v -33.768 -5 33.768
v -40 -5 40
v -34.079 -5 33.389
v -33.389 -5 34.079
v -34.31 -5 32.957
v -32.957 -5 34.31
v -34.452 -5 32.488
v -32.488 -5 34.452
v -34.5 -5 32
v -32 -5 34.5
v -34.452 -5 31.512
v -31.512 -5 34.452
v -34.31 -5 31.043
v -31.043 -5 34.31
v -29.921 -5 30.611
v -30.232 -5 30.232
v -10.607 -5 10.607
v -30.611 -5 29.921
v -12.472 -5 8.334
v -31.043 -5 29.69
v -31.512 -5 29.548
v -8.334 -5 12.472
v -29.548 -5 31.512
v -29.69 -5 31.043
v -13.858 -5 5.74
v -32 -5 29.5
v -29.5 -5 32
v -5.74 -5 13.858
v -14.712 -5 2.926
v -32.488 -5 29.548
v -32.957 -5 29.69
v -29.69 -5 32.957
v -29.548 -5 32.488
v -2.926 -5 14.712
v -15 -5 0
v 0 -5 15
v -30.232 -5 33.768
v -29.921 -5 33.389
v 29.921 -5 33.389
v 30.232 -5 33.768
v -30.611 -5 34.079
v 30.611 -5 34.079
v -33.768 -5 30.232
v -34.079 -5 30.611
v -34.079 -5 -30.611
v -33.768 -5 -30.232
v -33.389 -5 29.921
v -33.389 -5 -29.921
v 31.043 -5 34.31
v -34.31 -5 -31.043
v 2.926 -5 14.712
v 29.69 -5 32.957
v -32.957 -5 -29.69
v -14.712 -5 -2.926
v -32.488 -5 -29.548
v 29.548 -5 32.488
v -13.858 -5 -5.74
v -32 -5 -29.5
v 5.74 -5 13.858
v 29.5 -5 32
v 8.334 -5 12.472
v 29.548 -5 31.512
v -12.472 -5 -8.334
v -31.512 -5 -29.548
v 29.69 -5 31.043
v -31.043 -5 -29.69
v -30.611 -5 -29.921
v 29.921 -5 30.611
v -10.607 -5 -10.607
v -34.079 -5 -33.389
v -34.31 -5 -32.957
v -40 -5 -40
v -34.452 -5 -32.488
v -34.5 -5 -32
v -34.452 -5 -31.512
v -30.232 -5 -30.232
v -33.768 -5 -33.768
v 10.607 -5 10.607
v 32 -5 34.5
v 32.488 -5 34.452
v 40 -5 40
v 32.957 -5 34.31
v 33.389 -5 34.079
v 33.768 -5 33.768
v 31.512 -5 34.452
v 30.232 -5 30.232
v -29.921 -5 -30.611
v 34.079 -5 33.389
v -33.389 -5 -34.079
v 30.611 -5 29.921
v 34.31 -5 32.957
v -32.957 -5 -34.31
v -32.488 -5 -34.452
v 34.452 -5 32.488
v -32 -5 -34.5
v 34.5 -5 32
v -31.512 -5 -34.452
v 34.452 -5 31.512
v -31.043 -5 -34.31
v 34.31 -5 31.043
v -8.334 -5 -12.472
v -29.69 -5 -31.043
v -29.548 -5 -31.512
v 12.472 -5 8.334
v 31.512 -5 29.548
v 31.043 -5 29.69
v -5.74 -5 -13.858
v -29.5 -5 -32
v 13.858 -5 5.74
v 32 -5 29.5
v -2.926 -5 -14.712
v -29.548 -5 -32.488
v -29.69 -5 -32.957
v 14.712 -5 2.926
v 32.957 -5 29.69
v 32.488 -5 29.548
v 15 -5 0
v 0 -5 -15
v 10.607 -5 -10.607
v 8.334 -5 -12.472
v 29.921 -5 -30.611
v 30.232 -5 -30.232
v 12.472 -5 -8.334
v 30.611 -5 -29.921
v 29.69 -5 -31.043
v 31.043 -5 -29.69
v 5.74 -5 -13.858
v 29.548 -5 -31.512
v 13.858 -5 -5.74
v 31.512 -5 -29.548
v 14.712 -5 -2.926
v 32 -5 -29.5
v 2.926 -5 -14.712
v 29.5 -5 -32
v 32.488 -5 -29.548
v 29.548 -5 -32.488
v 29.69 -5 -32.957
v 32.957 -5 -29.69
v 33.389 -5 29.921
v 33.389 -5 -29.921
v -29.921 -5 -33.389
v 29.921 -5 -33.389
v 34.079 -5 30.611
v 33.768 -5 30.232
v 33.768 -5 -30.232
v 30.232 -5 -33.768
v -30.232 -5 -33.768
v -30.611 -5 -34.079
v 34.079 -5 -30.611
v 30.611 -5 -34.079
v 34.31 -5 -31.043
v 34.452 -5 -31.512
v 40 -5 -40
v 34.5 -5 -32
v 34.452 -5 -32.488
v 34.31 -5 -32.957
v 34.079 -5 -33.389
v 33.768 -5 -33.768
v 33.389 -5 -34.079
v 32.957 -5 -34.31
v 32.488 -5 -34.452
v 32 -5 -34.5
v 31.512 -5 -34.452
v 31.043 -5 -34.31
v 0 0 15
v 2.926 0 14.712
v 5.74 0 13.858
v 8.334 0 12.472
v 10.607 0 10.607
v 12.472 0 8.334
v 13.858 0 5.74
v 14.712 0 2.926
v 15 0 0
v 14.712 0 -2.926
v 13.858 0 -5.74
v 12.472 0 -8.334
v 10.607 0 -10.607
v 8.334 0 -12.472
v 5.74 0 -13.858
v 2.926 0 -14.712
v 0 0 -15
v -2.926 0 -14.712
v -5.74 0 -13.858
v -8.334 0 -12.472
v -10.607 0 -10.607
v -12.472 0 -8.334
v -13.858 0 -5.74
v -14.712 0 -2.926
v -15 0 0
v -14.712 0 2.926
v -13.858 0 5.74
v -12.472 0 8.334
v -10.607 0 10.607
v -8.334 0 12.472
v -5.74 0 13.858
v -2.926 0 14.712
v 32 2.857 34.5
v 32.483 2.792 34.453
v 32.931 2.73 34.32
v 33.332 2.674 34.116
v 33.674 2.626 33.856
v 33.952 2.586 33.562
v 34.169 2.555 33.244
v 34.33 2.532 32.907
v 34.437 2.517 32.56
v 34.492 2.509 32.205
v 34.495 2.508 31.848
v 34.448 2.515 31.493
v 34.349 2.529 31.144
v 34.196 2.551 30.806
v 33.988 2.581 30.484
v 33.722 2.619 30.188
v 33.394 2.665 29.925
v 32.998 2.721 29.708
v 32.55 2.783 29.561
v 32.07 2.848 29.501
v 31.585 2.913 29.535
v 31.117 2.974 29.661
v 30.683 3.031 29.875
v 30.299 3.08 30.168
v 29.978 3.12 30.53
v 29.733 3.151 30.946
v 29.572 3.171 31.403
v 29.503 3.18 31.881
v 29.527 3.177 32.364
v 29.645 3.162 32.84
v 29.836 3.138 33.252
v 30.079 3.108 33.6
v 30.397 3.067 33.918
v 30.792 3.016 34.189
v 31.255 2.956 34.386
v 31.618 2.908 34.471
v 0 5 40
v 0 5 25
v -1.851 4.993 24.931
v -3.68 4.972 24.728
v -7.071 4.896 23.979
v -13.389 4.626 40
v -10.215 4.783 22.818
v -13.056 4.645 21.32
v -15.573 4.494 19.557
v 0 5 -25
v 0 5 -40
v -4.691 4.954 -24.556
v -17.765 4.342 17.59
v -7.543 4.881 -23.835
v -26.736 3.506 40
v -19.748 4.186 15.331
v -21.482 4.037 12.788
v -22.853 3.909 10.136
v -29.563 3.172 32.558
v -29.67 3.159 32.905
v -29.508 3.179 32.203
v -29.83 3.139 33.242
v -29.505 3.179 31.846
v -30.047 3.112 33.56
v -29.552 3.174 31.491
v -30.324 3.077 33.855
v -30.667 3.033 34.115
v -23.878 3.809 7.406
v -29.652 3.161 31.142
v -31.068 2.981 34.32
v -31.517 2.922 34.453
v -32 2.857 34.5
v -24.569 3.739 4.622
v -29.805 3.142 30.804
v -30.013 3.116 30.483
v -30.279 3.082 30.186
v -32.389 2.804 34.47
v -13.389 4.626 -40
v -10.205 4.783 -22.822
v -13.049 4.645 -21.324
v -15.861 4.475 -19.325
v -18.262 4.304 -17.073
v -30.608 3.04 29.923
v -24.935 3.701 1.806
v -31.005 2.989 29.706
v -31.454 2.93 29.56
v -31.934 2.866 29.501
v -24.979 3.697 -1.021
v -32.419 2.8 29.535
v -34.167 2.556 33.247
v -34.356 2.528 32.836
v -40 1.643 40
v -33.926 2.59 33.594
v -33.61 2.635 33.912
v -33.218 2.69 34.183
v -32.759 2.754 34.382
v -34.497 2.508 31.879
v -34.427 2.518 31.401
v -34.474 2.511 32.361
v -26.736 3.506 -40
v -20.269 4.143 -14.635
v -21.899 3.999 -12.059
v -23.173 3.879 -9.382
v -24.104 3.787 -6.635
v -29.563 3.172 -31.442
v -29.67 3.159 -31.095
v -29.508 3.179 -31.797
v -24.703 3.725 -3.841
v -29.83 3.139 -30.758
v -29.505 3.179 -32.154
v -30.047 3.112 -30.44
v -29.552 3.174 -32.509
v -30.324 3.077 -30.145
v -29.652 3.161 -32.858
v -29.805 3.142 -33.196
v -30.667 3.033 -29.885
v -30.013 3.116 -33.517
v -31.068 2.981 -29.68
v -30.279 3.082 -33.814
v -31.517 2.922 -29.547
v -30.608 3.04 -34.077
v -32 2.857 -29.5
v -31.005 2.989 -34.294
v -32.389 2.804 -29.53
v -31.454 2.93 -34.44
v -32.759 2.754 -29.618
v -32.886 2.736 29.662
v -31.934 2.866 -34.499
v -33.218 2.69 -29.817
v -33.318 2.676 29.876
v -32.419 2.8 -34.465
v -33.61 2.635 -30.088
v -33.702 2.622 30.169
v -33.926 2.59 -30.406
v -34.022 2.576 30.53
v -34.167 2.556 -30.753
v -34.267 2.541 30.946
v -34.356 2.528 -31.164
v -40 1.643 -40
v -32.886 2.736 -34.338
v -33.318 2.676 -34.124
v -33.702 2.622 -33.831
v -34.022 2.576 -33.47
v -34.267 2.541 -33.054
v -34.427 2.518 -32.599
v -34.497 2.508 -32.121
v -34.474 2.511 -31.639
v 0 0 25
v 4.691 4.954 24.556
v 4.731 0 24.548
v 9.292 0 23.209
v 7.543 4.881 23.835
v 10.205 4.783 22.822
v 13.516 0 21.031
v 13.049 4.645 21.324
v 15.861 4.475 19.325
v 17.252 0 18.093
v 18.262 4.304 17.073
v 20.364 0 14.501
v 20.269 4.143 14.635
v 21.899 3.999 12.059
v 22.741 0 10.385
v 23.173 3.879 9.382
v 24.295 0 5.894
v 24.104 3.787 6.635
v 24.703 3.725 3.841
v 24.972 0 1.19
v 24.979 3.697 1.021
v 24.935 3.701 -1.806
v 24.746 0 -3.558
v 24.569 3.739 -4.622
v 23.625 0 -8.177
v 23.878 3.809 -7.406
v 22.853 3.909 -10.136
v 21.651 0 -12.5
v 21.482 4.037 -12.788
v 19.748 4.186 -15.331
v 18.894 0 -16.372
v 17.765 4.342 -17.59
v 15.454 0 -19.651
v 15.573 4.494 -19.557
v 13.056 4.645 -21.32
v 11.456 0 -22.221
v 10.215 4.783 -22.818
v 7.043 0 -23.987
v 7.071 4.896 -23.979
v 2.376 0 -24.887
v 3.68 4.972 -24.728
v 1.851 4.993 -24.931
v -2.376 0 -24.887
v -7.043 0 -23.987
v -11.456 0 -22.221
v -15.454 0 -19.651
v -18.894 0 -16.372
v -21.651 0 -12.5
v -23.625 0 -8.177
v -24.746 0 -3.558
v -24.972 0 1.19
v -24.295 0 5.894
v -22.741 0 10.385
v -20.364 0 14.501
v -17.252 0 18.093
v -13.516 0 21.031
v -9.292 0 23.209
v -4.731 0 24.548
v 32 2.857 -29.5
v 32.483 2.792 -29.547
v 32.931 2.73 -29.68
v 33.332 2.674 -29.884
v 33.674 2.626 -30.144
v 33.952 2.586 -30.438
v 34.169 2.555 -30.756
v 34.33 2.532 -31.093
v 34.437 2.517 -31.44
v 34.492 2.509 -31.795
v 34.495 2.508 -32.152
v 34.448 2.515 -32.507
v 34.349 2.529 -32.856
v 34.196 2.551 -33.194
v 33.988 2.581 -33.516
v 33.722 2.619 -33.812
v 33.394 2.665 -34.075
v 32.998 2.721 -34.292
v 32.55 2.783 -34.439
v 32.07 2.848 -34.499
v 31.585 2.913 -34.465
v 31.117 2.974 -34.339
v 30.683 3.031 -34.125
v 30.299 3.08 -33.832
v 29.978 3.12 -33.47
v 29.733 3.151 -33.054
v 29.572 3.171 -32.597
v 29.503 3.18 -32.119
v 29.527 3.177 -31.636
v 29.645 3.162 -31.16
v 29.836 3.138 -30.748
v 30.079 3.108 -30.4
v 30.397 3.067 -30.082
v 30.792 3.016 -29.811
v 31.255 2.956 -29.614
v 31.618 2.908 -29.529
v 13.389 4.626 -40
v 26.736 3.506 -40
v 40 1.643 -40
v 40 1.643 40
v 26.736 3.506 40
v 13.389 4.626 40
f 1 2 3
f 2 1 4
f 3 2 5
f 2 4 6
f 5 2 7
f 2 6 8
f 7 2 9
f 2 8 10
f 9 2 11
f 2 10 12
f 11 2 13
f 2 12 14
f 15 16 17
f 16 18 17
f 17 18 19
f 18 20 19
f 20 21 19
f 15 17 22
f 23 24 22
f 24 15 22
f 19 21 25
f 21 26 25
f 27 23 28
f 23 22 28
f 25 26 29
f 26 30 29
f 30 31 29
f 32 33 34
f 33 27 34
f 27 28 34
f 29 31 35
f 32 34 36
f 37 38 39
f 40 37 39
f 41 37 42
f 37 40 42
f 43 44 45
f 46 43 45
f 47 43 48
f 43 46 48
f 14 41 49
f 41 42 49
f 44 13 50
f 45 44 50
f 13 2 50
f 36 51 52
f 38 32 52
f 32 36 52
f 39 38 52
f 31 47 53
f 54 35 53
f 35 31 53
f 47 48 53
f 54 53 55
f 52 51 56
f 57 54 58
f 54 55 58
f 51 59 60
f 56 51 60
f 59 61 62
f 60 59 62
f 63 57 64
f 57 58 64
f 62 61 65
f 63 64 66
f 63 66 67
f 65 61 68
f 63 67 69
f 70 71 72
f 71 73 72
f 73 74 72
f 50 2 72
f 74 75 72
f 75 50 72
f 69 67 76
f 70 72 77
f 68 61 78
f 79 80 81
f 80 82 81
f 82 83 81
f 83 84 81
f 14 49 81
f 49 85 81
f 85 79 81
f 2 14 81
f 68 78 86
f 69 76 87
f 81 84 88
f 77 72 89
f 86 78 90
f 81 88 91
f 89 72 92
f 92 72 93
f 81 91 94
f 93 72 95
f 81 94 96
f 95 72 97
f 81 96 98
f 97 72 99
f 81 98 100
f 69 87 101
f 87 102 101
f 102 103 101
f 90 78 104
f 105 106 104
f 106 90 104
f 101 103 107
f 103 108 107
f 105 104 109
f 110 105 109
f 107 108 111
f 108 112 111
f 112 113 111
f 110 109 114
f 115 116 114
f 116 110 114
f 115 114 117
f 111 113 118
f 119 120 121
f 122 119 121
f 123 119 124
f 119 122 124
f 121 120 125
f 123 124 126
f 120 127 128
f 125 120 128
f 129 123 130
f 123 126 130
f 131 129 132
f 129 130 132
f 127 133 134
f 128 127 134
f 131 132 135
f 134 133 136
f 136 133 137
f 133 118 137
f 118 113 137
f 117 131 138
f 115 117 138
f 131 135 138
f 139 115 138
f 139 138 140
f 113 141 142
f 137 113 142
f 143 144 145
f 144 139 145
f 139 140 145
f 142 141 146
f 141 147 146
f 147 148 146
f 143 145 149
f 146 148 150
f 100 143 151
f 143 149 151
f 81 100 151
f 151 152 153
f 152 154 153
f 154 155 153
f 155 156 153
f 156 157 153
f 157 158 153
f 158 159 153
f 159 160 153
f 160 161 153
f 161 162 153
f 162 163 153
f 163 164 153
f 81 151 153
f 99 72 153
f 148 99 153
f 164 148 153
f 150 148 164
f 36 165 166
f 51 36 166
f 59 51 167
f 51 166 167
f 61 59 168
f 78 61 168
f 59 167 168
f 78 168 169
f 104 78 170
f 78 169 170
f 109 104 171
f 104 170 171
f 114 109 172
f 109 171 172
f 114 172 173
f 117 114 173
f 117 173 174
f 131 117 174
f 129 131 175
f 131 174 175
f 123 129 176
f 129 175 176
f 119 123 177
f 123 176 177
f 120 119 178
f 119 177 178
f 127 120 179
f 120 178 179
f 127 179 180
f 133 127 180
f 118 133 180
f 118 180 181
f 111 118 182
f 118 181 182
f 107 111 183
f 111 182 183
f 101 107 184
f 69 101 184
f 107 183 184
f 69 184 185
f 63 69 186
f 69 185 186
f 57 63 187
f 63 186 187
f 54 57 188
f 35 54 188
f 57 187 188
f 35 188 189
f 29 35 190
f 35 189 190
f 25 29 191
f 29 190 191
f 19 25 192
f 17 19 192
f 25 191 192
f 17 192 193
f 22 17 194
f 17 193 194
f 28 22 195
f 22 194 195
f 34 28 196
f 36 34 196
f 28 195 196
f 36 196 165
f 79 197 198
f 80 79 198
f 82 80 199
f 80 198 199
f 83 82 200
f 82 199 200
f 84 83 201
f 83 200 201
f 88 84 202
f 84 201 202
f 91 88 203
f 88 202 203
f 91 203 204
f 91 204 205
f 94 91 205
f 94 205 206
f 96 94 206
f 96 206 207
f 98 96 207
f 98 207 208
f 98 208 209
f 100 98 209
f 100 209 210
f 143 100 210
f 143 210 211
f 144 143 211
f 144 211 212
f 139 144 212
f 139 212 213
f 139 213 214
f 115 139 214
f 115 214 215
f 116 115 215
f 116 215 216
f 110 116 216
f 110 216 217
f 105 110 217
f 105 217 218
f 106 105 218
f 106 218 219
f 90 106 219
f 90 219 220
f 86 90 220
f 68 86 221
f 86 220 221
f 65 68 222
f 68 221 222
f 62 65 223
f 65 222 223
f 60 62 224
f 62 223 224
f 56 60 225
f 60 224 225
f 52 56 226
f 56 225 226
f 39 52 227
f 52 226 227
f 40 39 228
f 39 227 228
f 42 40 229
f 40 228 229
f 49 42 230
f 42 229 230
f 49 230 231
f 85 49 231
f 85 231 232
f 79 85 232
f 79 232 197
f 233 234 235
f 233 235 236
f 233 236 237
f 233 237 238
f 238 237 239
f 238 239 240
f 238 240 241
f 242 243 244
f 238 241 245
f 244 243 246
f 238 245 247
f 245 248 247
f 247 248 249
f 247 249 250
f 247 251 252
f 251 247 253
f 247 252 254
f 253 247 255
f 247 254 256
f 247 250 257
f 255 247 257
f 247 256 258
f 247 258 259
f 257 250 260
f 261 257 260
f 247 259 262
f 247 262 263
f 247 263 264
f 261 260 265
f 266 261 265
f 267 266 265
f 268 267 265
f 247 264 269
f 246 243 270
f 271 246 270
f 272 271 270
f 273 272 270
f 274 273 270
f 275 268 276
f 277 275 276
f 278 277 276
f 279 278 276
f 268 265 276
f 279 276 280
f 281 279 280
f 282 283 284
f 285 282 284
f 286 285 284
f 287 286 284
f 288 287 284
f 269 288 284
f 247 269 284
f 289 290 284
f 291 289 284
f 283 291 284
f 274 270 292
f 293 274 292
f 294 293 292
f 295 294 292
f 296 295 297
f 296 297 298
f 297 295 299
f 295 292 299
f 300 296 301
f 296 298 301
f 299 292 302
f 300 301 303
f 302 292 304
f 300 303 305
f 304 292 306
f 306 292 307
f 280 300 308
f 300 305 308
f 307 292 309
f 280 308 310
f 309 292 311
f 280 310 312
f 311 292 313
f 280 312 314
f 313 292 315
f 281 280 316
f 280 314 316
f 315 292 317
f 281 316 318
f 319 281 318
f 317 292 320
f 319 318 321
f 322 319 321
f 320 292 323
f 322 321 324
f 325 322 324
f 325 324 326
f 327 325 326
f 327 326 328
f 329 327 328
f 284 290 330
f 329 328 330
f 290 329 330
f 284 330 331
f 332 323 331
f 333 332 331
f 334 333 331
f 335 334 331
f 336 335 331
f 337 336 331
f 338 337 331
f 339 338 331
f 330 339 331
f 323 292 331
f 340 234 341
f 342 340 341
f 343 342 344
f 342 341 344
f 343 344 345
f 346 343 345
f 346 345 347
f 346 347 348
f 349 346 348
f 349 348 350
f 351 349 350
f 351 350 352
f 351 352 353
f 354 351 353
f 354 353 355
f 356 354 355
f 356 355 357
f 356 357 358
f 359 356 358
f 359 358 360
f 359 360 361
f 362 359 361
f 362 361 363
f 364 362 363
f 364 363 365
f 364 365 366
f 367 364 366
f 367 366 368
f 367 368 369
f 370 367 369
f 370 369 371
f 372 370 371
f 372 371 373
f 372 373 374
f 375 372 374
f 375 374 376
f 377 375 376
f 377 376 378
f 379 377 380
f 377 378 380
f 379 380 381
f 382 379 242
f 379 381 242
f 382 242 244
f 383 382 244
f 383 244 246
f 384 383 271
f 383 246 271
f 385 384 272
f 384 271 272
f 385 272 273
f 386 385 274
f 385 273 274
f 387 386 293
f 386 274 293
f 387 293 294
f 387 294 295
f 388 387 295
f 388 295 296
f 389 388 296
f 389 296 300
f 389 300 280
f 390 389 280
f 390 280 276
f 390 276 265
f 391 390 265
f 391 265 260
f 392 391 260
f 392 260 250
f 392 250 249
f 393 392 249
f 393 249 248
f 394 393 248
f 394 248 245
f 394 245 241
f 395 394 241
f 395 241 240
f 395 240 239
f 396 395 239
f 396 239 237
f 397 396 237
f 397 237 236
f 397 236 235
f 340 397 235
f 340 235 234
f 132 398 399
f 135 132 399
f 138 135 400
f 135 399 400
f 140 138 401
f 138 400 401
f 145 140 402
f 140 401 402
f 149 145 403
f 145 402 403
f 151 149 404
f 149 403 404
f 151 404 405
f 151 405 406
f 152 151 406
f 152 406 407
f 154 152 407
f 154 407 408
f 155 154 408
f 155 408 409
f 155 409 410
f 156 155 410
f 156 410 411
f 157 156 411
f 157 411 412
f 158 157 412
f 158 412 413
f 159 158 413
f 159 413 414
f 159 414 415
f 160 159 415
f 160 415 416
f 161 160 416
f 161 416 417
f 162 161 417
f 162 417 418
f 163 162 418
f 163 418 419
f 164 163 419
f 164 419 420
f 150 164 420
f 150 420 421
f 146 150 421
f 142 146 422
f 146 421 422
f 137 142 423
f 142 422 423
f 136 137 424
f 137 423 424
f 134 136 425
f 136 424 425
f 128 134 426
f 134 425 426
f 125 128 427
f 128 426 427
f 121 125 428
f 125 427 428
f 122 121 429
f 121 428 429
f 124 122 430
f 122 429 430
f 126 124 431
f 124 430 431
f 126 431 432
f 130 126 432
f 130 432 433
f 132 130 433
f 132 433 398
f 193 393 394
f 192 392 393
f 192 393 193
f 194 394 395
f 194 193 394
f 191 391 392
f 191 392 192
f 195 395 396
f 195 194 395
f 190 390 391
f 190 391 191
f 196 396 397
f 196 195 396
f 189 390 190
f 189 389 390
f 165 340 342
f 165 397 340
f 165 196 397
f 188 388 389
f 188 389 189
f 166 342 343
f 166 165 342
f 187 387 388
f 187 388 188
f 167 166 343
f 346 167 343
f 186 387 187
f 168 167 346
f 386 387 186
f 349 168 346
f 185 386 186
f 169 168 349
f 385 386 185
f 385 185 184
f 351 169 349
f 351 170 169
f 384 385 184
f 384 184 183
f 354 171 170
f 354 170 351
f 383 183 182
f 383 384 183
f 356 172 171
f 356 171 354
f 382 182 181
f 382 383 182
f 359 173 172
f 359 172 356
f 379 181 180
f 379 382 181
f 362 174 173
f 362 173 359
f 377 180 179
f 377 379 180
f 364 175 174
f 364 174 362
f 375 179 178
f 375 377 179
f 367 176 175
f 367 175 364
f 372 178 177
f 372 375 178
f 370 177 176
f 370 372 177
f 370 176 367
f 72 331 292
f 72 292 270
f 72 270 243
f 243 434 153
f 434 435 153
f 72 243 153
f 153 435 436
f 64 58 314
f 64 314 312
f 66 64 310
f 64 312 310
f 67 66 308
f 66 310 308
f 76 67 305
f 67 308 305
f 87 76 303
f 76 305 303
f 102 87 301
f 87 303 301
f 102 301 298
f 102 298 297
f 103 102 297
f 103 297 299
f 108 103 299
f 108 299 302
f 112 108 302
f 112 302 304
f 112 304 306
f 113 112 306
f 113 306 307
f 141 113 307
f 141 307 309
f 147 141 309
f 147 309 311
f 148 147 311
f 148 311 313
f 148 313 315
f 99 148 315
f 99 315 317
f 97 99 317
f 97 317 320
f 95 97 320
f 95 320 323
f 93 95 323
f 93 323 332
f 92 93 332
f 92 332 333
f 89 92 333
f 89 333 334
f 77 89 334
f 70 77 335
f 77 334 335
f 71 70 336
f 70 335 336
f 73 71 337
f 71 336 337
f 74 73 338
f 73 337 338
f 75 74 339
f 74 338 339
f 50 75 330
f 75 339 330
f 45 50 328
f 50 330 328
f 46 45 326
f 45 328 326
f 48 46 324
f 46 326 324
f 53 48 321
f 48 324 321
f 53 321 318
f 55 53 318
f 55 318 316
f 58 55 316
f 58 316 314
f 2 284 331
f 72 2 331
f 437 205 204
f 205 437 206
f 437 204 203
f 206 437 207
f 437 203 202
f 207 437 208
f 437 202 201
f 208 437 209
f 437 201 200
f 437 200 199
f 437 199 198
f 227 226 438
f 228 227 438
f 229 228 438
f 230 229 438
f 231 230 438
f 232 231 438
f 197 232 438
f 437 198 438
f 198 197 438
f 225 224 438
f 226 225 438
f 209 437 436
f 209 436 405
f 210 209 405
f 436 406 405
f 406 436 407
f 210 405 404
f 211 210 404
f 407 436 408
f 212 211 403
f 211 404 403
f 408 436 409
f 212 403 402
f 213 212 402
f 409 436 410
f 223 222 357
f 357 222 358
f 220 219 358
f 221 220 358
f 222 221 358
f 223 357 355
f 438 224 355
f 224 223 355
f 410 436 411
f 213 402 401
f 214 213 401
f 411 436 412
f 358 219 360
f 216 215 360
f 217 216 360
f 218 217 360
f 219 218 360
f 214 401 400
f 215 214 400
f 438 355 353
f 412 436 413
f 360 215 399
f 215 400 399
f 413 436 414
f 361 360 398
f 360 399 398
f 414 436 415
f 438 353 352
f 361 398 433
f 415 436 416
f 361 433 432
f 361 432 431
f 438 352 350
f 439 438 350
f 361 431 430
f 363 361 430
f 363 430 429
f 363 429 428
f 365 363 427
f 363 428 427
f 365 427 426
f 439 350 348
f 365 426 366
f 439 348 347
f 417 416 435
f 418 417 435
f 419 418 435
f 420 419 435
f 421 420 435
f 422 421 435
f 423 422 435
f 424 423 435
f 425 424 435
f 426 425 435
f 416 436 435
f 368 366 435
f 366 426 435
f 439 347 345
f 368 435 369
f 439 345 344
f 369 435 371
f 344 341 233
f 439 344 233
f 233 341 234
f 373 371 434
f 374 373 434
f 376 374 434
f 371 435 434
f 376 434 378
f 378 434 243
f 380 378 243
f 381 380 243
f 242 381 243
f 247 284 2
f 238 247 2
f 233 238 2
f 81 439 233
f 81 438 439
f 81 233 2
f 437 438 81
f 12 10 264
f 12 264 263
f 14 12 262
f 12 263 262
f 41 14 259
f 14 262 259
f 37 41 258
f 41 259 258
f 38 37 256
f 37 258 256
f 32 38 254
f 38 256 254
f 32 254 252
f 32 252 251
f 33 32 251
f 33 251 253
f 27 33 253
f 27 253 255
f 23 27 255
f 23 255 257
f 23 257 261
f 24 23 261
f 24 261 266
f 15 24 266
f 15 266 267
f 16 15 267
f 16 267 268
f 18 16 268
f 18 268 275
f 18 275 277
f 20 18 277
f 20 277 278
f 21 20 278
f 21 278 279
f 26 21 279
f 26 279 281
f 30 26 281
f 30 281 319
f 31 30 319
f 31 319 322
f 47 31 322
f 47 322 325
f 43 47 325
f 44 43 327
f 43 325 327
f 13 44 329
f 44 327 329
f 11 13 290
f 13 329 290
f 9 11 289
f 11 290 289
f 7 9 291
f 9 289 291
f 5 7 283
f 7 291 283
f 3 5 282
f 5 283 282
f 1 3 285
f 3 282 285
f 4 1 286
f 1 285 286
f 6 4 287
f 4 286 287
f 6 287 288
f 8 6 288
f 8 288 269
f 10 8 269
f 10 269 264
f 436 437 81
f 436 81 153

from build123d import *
from build123d.topology import SkipClean

# Parameters (mm, degrees)
SKETCH1_3_W             = 80
SKETCH1_3_H             = 80
SKETCH1_3_R             = 2.5
SKETCH1_3_R_2           = 15
BOSS_EXTRUDE3_DEPTH     = 5
BOSS_EXTRUDE4_START     = 5
SKETCH1_W               = 80
SKETCH1_H               = 80
SKETCH1_R               = 2.5
SKETCH1_R_2             = 25
BOSS_EXTRUDE4_DEPTH     = 5
CUT_EXTRUDE2_DEPTH      = 57.789083458
CUT_EXTRUDE2_DEPTH_BACK = 57.789083458
CUT_EXTRUDE3_DEPTH      = 57.789083608
CUT_EXTRUDE3_DEPTH_BACK = 57.789083608


with BuildPart() as part:
    # Sketch1<3> → Boss-Extrude3 (new body)
    with BuildSketch(Plane(origin=(0, 0, 0), x_dir=(1, 0, 0), z_dir=(0, 1, 0))):
        Rectangle(SKETCH1_3_W, SKETCH1_3_H)
        with Locations((-32, -32)):
            Circle(SKETCH1_3_R, mode=Mode.SUBTRACT)
        with Locations((32, -32)):
            Circle(SKETCH1_3_R, mode=Mode.SUBTRACT)
        with Locations((-32, 32)):
            Circle(SKETCH1_3_R, mode=Mode.SUBTRACT)
        with Locations((32, 32)):
            Circle(SKETCH1_3_R, mode=Mode.SUBTRACT)
        Circle(SKETCH1_3_R_2, mode=Mode.SUBTRACT)
    extrude(amount=-BOSS_EXTRUDE3_DEPTH)

    # Sketch1 → Boss-Extrude4 (add)
    with BuildSketch(Plane(origin=(0, 0, 0), x_dir=(1, 0, 0), z_dir=(0, 1, 0)).offset(BOSS_EXTRUDE4_START)):
        Rectangle(SKETCH1_W, SKETCH1_H)
        with Locations((-32, -32)):
            Circle(SKETCH1_R, mode=Mode.SUBTRACT)
        with Locations((32, -32)):
            Circle(SKETCH1_R, mode=Mode.SUBTRACT)
        Circle(SKETCH1_R_2, mode=Mode.SUBTRACT)
        with Locations((-32, 32)):
            Circle(SKETCH1_R, mode=Mode.SUBTRACT)
        with Locations((32, 32)):
            Circle(SKETCH1_R, mode=Mode.SUBTRACT)
    extrude(amount=-BOSS_EXTRUDE4_DEPTH)

    # Sketch3 → Cut-Extrude2 (cut, two sides: drawn at the far end of the back side and taken through both)
    with BuildSketch(Plane.XY.offset(-CUT_EXTRUDE2_DEPTH_BACK)):
        with BuildLine():
            Line((-40, 1.643191324), (-40, 5))
            Line((-40, 5), (0, 5))
            ThreePointArc((0, 5), (-20.070302467, 4.159325469), (-40, 1.643191324))
        make_face()
    extrude(amount=CUT_EXTRUDE2_DEPTH + CUT_EXTRUDE2_DEPTH_BACK, mode=Mode.SUBTRACT)

    # Sketch3<4> → Cut-Extrude3 (cut, two sides: drawn at the far end of the back side and taken through both)
    with SkipClean():  # the faces are left unmerged after this step: merging them gives an invalid solid
        with BuildSketch(Plane.XY.offset(-CUT_EXTRUDE3_DEPTH_BACK)):
            with BuildLine():
                Line((40, 5), (40, 1.643191324))
                ThreePointArc((40, 1.643191324), (20.070302467, 4.159325469), (0, 5))
                Line((0, 5), (40, 5))
            make_face()
        extrude(amount=CUT_EXTRUDE3_DEPTH + CUT_EXTRUDE3_DEPTH_BACK, mode=Mode.SUBTRACT)


solid = part.part
